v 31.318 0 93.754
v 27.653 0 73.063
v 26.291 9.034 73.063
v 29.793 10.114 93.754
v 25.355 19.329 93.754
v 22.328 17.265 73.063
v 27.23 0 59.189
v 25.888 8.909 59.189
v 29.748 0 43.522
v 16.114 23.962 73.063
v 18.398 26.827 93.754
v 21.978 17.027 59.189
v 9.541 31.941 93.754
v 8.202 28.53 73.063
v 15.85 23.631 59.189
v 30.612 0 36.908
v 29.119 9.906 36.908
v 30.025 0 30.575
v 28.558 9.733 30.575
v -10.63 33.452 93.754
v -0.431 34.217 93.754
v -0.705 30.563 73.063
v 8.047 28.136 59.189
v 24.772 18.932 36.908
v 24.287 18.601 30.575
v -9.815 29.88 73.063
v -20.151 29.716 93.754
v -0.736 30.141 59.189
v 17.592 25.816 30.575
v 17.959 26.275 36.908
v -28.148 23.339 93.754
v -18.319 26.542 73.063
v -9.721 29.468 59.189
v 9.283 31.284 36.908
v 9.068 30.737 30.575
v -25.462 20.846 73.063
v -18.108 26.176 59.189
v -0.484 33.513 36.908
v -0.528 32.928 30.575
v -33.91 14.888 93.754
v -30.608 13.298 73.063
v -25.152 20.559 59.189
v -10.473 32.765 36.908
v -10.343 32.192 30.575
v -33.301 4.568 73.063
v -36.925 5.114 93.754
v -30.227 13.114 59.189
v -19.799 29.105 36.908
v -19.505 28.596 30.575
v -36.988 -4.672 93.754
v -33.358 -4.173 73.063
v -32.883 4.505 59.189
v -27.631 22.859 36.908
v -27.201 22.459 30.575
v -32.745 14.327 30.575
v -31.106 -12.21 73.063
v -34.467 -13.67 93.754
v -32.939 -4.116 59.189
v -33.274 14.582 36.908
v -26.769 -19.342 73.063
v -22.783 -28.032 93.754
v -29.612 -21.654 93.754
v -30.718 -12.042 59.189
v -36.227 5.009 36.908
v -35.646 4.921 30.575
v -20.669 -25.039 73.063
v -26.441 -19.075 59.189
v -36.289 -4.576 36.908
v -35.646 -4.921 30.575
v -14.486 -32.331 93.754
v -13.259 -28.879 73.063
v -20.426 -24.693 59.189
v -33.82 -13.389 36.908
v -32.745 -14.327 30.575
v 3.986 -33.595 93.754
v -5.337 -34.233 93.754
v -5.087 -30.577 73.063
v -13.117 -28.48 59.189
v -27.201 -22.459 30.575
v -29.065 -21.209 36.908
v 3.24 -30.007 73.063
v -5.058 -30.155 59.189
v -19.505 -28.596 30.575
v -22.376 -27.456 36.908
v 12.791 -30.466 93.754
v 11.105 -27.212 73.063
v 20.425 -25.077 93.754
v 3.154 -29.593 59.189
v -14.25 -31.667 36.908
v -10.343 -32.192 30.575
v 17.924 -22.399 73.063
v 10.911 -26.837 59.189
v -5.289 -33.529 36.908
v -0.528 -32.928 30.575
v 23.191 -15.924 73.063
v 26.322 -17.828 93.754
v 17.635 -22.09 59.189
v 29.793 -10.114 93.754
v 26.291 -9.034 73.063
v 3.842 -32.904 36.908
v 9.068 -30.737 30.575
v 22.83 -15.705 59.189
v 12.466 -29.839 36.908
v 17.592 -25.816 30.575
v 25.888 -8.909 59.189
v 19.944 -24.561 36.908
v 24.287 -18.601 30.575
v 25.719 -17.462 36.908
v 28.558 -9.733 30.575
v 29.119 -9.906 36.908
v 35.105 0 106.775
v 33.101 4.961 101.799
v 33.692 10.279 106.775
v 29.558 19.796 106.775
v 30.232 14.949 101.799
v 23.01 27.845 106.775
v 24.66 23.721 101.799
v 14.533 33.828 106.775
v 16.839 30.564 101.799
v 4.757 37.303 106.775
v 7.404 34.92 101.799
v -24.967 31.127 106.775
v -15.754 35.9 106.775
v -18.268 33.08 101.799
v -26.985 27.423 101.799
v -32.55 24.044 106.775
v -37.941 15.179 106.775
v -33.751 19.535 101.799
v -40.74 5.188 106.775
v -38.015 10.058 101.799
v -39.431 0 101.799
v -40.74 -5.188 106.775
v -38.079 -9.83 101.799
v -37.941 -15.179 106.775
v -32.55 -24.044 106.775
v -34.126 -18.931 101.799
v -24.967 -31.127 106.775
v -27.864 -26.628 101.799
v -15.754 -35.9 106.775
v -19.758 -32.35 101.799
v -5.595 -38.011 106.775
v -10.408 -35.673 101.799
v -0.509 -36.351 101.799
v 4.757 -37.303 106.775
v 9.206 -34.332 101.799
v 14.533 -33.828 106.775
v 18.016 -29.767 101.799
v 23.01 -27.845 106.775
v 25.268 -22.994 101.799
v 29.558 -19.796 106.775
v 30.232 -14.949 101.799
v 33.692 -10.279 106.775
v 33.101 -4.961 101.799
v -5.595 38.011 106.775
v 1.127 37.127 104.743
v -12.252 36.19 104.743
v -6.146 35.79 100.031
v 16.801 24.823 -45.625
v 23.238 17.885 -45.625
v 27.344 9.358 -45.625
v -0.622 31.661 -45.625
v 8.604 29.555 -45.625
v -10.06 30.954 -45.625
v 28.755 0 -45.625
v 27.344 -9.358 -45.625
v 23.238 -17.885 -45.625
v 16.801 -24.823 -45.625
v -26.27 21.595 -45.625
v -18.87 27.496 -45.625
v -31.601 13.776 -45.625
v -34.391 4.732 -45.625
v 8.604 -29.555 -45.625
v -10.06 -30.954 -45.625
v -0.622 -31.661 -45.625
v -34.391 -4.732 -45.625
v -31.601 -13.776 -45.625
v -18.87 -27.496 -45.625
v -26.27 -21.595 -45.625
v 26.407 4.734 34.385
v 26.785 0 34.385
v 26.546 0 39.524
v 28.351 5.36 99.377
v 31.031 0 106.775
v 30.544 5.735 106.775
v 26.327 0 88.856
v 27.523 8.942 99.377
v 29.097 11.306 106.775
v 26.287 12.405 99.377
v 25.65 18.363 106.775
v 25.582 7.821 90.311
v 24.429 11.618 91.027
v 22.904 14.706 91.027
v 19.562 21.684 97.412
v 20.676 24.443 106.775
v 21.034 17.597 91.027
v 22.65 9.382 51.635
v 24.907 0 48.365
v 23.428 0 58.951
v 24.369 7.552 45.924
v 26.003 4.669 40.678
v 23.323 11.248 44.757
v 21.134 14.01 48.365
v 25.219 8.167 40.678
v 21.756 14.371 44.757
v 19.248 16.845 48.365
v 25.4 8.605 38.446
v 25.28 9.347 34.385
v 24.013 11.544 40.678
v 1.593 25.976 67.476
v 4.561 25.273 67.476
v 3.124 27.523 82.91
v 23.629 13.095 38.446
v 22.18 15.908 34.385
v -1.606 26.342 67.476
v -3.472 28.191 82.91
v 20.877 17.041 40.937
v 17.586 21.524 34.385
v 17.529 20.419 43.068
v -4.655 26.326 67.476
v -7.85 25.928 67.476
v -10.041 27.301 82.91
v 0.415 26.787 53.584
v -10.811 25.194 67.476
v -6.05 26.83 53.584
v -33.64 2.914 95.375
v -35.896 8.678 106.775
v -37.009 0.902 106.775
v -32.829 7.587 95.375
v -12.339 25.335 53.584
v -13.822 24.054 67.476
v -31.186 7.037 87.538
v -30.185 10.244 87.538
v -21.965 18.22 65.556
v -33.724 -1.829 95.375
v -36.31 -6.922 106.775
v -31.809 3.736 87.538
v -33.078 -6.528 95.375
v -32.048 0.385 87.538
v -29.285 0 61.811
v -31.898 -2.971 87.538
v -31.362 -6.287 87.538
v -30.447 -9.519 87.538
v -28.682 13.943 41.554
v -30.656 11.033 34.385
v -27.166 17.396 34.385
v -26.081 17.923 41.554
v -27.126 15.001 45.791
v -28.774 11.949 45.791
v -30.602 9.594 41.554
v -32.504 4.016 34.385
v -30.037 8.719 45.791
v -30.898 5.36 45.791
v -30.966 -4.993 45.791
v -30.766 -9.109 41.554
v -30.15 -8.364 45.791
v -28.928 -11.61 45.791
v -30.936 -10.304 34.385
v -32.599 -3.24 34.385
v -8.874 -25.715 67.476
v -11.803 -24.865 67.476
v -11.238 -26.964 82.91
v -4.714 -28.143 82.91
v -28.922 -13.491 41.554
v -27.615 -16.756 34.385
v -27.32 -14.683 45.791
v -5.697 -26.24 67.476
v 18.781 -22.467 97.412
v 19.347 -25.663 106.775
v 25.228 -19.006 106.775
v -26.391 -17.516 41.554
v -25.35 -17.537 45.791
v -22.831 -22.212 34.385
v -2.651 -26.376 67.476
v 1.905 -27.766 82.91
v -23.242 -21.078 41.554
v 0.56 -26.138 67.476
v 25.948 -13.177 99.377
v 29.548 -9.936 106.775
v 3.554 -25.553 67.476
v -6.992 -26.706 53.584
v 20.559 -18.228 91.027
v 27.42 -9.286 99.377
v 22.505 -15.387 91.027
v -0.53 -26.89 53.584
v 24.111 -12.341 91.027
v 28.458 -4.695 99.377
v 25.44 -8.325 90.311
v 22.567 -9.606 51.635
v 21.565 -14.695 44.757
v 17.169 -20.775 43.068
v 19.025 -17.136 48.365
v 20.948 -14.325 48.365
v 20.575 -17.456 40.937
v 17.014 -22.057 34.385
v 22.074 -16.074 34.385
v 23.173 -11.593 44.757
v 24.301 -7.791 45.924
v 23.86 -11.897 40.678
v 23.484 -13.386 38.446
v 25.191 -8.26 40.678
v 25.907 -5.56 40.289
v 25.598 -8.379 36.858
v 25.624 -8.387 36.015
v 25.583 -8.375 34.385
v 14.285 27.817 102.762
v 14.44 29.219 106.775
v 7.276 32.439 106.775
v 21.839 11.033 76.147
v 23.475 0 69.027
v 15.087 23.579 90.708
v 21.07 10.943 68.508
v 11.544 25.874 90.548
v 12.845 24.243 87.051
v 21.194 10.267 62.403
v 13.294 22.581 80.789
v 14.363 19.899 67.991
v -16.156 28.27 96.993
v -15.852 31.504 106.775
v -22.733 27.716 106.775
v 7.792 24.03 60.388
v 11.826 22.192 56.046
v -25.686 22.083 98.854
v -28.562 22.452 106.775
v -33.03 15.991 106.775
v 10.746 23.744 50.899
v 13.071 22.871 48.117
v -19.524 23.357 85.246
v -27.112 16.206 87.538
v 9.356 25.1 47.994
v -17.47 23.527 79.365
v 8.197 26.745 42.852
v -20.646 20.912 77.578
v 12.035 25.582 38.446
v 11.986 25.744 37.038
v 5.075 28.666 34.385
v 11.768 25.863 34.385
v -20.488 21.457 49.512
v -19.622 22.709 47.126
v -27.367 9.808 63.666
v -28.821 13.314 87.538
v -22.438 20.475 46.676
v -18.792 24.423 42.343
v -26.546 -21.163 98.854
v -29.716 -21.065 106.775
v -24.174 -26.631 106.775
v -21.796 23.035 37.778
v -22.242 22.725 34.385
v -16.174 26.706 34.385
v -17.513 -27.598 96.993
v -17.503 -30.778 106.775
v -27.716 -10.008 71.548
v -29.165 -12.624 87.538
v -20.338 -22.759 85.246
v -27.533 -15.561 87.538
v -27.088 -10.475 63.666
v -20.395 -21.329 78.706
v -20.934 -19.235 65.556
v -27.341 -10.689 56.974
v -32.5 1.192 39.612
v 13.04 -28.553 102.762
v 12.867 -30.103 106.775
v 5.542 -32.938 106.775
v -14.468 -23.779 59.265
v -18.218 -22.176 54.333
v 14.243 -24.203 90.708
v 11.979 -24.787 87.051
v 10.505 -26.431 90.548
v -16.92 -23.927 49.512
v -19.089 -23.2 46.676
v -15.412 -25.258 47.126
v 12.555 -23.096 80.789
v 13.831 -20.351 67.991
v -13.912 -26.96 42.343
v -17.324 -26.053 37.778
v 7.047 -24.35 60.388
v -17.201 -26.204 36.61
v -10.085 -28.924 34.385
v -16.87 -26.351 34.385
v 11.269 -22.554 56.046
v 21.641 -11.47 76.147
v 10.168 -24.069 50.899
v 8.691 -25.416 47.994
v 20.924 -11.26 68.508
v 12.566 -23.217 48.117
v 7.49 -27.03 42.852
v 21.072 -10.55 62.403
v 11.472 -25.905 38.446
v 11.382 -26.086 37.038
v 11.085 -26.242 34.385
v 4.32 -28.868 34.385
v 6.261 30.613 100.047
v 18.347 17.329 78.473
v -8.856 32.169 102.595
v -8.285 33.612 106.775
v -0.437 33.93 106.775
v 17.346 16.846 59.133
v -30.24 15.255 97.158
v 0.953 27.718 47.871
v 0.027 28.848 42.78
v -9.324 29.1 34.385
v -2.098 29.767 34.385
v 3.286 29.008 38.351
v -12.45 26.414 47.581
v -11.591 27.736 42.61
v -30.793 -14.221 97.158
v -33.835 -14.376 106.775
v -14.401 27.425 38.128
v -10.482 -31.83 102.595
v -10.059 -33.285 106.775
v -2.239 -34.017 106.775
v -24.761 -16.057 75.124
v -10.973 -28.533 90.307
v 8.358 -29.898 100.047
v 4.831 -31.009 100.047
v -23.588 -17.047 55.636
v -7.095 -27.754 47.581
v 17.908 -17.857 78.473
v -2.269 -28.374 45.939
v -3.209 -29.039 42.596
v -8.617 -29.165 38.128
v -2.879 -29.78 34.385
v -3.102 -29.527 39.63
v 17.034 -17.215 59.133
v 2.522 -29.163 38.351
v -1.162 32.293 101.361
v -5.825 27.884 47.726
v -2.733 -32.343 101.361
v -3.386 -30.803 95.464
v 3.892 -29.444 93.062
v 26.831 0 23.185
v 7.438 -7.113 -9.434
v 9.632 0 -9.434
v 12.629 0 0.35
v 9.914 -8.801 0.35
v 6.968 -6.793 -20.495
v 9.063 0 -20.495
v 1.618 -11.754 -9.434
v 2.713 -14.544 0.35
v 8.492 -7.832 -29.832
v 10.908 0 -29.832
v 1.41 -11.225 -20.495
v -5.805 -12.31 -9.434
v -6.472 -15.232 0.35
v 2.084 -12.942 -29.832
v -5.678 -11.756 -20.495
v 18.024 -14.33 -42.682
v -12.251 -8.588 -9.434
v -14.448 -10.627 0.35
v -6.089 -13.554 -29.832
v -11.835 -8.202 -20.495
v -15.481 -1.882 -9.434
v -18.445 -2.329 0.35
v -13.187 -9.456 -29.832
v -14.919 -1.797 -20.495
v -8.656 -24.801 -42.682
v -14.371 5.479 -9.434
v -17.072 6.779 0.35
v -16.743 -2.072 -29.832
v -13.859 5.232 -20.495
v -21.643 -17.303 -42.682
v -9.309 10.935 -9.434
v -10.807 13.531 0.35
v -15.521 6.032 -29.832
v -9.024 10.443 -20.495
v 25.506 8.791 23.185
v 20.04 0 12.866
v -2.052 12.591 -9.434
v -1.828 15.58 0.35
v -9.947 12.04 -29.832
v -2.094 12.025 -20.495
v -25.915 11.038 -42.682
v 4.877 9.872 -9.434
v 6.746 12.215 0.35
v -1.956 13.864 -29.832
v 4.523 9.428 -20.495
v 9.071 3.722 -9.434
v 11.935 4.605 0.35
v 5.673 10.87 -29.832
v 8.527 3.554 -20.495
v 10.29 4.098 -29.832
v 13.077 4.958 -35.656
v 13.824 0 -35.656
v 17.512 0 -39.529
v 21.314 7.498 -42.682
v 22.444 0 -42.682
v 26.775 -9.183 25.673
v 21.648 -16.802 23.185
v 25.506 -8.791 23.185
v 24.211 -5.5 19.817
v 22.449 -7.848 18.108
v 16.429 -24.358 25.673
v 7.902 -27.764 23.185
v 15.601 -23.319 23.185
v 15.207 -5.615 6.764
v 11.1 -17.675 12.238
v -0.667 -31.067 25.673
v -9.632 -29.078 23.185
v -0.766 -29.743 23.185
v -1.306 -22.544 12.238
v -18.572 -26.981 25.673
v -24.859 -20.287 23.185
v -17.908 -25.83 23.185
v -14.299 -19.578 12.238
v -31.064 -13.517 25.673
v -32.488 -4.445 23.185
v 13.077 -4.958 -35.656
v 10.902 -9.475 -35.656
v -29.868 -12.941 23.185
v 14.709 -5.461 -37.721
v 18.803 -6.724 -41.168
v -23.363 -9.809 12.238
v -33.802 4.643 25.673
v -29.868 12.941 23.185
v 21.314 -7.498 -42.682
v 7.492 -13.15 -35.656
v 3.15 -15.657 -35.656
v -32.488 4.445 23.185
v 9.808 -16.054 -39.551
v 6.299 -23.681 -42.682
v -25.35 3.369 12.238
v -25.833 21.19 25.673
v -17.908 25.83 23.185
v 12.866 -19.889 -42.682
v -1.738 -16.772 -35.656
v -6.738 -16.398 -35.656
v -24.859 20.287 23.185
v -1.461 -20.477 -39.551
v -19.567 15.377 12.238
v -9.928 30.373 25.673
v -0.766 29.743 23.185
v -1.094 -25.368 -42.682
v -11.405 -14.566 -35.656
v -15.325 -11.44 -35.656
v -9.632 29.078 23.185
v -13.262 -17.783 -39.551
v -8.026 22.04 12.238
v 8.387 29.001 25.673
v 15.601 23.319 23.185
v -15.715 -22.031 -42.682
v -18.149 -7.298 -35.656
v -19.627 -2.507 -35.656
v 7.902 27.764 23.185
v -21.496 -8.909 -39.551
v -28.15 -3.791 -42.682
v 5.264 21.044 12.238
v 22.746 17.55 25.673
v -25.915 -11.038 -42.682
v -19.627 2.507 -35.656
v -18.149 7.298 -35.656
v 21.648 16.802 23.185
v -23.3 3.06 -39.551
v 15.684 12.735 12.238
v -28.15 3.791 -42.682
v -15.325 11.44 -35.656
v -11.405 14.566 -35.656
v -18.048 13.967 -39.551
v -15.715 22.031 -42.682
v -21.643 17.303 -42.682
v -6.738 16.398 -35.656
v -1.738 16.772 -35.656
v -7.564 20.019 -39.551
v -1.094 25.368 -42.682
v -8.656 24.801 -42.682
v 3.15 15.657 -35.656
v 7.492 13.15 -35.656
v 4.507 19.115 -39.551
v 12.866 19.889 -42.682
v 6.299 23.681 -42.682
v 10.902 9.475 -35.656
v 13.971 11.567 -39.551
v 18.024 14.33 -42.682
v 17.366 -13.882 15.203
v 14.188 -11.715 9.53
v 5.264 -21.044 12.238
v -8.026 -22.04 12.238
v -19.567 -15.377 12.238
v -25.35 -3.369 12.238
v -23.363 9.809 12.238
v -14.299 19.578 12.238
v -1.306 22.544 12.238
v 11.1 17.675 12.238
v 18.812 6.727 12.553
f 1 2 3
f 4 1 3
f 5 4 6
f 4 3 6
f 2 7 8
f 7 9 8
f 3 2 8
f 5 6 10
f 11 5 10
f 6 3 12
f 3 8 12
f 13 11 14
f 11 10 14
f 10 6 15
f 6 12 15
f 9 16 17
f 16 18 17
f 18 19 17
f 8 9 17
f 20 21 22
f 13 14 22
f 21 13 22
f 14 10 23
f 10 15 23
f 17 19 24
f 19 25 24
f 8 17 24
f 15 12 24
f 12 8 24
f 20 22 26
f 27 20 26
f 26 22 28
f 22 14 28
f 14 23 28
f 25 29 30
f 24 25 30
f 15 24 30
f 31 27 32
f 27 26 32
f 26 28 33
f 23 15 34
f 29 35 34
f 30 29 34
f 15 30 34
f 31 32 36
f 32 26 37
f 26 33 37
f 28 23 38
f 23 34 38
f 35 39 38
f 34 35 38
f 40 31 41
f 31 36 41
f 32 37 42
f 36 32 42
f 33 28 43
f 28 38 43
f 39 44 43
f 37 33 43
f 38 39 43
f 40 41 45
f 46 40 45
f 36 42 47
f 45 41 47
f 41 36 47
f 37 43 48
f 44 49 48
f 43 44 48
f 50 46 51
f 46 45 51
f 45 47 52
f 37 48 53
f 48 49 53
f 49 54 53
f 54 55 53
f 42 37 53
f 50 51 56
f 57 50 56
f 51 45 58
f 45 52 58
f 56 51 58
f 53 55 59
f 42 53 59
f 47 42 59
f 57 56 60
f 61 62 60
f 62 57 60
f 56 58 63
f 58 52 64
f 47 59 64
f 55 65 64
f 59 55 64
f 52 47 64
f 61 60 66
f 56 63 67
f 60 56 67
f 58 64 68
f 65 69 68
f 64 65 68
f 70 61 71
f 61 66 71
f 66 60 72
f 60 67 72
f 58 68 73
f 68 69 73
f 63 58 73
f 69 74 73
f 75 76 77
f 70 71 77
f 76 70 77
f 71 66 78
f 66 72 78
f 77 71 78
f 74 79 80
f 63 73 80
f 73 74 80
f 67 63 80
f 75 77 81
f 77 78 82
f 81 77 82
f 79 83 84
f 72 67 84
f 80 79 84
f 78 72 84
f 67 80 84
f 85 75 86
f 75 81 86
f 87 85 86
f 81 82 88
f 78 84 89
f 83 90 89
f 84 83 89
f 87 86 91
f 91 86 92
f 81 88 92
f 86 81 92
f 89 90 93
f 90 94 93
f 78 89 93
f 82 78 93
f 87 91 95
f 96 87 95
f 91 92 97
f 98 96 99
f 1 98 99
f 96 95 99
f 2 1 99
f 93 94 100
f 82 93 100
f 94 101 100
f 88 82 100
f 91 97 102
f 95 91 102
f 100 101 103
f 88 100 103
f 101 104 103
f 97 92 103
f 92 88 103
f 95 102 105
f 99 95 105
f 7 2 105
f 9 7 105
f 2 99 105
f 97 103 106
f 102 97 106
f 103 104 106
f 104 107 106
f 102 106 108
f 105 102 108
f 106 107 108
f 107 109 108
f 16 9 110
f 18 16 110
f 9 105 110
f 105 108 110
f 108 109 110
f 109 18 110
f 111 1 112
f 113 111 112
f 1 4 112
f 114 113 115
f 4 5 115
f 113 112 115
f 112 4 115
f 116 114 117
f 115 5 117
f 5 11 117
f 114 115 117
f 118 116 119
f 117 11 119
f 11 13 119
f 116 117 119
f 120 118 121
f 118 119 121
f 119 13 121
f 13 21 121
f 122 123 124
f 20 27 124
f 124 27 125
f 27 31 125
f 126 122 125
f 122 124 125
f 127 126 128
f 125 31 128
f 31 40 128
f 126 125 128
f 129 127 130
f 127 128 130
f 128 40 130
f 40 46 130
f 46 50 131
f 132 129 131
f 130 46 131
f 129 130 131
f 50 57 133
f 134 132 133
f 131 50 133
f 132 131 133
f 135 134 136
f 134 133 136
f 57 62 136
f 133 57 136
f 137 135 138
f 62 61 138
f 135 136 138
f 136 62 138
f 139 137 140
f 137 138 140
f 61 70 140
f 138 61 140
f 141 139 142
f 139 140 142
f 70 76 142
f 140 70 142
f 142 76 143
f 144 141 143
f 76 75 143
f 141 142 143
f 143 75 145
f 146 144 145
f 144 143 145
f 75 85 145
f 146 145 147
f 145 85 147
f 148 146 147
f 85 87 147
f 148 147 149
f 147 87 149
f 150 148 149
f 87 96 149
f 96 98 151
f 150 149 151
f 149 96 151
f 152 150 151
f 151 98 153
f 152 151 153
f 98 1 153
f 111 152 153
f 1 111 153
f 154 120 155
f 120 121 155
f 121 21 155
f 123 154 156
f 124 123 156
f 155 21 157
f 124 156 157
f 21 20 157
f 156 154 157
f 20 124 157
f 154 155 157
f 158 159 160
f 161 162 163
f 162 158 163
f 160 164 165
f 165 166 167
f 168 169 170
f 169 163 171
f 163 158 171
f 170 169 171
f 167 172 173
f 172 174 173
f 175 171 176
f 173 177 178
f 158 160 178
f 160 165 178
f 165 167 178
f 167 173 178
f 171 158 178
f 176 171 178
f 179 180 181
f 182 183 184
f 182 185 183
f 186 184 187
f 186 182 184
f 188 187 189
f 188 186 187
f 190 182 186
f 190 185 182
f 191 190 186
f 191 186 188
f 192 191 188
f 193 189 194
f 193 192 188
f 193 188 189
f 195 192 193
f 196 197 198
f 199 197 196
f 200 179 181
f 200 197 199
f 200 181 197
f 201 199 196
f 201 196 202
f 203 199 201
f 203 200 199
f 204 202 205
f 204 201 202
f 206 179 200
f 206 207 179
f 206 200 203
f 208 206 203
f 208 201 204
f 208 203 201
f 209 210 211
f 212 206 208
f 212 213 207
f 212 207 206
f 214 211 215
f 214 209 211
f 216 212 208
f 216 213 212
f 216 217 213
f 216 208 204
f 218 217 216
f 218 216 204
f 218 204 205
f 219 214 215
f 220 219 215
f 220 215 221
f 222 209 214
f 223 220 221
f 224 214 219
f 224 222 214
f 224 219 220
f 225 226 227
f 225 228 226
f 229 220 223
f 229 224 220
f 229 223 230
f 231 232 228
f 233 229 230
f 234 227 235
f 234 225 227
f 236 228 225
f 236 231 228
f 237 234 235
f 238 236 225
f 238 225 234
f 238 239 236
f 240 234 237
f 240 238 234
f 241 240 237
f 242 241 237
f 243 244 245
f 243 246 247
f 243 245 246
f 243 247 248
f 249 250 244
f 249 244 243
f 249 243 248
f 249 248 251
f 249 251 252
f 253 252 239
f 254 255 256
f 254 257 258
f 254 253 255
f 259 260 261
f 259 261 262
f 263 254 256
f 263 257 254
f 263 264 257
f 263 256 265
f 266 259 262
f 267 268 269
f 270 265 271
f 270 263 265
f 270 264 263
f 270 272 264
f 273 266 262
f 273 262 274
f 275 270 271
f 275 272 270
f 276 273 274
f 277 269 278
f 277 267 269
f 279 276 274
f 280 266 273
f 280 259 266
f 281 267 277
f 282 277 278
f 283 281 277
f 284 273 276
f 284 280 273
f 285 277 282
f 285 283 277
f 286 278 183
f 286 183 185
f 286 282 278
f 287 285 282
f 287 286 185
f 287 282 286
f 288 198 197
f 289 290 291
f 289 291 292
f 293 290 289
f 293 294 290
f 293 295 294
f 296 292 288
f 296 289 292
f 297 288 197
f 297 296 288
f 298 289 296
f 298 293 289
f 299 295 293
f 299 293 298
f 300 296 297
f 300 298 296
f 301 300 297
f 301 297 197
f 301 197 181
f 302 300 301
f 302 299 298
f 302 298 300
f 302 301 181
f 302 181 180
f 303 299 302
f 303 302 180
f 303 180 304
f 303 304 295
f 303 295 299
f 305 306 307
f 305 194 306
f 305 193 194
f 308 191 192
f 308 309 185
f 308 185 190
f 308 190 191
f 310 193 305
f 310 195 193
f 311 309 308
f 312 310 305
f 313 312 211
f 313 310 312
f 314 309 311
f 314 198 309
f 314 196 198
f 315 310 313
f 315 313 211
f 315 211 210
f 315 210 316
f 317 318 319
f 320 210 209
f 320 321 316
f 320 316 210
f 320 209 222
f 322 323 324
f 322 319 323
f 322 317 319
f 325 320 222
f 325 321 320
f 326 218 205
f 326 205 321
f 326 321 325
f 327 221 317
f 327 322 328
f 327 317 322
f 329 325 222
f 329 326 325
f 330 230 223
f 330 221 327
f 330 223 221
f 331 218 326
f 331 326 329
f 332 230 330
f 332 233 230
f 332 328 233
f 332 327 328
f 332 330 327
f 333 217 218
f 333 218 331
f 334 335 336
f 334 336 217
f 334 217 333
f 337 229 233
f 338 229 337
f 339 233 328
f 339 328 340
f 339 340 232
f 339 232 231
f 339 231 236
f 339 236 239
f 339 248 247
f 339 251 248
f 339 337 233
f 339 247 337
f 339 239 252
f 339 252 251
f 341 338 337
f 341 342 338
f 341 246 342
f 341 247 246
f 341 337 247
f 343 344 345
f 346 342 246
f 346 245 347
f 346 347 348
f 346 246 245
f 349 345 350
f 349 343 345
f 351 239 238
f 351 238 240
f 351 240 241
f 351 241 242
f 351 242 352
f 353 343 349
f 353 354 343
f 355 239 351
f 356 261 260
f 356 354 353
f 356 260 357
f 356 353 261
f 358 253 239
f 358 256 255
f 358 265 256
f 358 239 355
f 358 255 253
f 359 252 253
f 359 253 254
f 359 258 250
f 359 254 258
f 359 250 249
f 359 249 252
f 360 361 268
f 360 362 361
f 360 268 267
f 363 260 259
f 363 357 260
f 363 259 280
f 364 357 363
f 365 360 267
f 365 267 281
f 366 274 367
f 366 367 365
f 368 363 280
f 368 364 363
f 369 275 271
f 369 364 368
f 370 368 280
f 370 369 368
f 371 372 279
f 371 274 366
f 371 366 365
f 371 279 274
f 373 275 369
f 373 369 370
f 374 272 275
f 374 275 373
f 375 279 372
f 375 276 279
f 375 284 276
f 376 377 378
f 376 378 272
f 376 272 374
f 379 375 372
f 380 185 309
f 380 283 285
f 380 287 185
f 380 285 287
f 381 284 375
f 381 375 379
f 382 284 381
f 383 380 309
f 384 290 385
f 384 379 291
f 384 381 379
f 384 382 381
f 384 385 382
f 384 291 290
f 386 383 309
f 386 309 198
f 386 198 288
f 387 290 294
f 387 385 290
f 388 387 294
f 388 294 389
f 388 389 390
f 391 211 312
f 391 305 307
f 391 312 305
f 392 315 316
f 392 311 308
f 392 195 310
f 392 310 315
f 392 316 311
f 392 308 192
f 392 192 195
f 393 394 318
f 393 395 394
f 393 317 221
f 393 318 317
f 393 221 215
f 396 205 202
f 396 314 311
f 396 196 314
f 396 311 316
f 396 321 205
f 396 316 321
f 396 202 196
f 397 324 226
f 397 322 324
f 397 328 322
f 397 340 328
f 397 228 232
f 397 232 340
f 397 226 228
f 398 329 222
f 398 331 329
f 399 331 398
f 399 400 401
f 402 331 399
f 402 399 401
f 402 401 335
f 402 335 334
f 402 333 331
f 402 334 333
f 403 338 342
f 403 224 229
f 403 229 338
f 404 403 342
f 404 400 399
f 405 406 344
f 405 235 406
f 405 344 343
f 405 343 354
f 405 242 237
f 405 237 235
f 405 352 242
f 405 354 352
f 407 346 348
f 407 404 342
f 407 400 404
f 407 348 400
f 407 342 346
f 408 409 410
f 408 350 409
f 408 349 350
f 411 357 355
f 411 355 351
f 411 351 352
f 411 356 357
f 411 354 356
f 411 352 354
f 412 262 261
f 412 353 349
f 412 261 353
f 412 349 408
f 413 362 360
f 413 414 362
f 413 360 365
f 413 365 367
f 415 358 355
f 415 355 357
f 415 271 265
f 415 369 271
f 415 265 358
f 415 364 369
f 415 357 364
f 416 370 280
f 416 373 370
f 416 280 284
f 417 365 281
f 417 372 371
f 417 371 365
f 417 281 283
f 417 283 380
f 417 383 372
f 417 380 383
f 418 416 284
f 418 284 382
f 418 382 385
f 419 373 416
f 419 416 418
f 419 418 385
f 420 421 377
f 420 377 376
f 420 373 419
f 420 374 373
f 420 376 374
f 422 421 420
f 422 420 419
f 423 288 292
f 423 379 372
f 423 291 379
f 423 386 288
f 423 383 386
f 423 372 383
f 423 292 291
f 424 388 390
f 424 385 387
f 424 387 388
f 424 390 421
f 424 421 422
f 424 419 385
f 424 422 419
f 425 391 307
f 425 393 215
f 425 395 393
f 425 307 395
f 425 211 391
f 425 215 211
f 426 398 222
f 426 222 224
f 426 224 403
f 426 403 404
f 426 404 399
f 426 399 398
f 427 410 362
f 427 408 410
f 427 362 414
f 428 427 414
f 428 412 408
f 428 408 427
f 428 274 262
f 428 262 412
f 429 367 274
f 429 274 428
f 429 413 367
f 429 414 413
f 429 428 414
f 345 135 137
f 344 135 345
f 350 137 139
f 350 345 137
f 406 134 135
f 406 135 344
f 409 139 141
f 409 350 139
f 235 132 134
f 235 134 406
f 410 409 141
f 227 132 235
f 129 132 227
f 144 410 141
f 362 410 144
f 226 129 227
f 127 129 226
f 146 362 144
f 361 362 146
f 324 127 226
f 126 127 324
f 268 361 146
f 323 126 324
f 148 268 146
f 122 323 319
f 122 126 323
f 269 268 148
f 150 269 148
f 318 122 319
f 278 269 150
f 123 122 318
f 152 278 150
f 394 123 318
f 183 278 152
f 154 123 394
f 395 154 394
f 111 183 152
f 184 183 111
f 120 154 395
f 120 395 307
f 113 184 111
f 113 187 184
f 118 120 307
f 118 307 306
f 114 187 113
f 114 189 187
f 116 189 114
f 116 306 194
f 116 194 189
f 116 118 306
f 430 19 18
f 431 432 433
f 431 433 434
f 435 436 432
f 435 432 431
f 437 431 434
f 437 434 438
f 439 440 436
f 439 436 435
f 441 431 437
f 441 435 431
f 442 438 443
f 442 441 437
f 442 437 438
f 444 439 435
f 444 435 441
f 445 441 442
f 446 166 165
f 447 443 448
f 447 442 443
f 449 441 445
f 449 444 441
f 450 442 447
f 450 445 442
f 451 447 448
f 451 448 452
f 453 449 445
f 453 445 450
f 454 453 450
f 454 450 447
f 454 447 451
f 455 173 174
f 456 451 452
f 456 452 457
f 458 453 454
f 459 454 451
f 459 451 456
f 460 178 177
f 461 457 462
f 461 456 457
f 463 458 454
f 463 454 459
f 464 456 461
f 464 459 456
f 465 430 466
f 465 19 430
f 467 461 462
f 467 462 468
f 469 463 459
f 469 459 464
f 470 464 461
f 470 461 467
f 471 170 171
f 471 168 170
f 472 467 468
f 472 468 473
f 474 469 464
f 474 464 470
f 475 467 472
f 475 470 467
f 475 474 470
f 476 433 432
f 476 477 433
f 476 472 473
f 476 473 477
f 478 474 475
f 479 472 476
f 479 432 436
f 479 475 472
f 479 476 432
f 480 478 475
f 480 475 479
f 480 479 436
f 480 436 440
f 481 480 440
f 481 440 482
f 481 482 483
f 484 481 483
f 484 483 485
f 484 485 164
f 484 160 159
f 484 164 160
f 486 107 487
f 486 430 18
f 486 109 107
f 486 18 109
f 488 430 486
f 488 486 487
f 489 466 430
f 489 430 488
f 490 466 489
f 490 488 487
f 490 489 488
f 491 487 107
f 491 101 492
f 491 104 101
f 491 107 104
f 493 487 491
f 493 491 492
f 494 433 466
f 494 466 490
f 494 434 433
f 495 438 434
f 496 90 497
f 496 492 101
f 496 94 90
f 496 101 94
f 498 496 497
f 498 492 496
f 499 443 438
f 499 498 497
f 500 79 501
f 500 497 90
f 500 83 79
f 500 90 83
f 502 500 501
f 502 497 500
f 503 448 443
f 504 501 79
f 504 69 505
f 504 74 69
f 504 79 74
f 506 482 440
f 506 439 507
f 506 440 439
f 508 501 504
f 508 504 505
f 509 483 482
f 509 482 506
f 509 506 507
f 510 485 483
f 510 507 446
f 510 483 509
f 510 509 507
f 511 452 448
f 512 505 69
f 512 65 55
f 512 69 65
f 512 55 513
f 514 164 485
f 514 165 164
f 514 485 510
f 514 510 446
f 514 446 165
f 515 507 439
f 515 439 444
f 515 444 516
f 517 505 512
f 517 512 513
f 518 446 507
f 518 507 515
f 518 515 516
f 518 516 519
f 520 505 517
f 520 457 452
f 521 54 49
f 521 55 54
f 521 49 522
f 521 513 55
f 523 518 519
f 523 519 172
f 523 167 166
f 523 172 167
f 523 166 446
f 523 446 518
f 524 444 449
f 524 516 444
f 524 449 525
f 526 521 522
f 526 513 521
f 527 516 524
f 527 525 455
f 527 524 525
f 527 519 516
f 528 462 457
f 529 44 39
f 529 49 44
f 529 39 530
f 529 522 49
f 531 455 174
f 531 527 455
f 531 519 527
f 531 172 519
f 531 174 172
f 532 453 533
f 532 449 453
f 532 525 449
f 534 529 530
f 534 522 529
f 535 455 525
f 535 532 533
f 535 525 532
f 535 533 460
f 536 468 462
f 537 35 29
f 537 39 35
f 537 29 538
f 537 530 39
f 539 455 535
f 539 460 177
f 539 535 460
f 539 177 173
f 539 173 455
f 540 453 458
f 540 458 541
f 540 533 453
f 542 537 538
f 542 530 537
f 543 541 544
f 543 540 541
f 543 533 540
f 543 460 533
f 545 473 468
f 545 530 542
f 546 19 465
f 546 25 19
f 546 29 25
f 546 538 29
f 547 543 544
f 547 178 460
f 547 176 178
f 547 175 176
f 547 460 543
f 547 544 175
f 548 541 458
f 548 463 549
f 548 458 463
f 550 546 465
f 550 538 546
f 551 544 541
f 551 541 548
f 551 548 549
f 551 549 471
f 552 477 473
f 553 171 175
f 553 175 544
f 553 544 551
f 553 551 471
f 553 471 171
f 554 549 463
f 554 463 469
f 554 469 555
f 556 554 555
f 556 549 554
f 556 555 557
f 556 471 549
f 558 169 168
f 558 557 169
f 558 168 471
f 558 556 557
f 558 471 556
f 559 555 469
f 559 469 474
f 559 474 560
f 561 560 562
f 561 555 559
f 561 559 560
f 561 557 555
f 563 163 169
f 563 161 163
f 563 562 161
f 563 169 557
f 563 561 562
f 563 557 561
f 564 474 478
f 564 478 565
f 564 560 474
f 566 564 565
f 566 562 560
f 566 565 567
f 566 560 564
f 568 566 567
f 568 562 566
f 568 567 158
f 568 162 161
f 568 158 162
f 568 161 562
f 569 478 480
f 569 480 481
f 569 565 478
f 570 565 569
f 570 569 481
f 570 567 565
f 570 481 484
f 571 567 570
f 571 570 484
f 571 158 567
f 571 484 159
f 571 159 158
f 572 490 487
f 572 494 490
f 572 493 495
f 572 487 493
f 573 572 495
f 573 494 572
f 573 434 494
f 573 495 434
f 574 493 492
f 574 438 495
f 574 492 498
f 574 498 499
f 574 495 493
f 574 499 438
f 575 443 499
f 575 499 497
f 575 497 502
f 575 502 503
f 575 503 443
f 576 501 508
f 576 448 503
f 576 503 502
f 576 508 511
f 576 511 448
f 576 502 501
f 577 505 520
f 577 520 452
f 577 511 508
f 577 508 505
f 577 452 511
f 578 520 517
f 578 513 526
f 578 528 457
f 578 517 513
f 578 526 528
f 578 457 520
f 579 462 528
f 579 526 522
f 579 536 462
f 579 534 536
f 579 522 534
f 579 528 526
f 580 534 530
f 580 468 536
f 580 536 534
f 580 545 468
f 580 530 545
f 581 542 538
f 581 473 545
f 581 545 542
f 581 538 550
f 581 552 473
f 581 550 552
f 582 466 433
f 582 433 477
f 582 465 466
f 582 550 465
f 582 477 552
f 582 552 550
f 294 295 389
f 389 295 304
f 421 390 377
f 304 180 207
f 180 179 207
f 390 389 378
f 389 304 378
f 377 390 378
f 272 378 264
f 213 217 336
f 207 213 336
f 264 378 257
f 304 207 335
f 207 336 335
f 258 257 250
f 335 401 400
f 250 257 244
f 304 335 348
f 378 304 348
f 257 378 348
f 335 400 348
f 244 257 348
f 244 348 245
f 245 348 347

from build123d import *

# Parameters (mm, degrees)
F2_T = -3.81


with BuildPart() as f1:
    # F0 (on Front) → F1 (revolve)
    with BuildSketch(Plane.XZ):
        with BuildLine():
            Line((-2.9951573074, 106.7754722372), (-2.9951573074, 30.5754722372))
            Line((-2.9951573074, 30.5754722372), (30.0248426926, 30.5754722372))
            add(Edge.make_bspline(
                [(35.1048426926, 106.7754722372), (32.9483391915, 101.5926443587), (21.5294493719, 58.8197385465), (32.3306136174, 39.6279871533), (30.0248426926, 30.5754722372)],
                knots=[0, 0, 0, 0, 0.2360344588, 0.4321371478, 0.4321371478, 0.4321371478, 0.4321371478], degree=3))
            Line((35.1048426926, 106.7754722372), (-2.9951573074, 106.7754722372))
        make_face()
    revolve(axis=Axis((-2.9951573074, 0, 68.6754722372), (0, 0, 1)))

    # F2
    f2_openings = [f1.faces().sort_by_distance(p)[0] for p in [
        (-2.995157, 0, 106.775472),
    ]]
    offset(amount=F2_T, openings=f2_openings)

    # F0 (on Front) → F3 (revolve)
    with BuildSketch(Plane.XZ):
        with BuildLine():
            Line((30.0248426926, 30.5754722372), (-2.9951573074, 30.5754722372))
            Line((-2.9951573074, 30.5754722372), (-2.9951573074, -45.6245277628))
            Line((-2.9951573074, -45.6245277628), (28.7548426926, -45.6245277628))
            add(Edge.make_bspline(
                [(30.0248426926, 30.5754722372), (27.5291324555, 20.7772507814), (6.462377675, 1.1334030314), (9.1514726232, -35.7913107682), (20.4815940881, -42.0784909642), (28.7548426926, -45.6245277628)],
                knots=[0.4321371478, 0.4321371478, 0.4321371478, 0.4321371478, 0.6443939177, 0.8408968049, 1, 1, 1, 1], degree=3))
        make_face()
    revolve(axis=Axis((-2.9951573074, 0, -7.5245277628), (0, 0, -1)))


solid = f1.part
